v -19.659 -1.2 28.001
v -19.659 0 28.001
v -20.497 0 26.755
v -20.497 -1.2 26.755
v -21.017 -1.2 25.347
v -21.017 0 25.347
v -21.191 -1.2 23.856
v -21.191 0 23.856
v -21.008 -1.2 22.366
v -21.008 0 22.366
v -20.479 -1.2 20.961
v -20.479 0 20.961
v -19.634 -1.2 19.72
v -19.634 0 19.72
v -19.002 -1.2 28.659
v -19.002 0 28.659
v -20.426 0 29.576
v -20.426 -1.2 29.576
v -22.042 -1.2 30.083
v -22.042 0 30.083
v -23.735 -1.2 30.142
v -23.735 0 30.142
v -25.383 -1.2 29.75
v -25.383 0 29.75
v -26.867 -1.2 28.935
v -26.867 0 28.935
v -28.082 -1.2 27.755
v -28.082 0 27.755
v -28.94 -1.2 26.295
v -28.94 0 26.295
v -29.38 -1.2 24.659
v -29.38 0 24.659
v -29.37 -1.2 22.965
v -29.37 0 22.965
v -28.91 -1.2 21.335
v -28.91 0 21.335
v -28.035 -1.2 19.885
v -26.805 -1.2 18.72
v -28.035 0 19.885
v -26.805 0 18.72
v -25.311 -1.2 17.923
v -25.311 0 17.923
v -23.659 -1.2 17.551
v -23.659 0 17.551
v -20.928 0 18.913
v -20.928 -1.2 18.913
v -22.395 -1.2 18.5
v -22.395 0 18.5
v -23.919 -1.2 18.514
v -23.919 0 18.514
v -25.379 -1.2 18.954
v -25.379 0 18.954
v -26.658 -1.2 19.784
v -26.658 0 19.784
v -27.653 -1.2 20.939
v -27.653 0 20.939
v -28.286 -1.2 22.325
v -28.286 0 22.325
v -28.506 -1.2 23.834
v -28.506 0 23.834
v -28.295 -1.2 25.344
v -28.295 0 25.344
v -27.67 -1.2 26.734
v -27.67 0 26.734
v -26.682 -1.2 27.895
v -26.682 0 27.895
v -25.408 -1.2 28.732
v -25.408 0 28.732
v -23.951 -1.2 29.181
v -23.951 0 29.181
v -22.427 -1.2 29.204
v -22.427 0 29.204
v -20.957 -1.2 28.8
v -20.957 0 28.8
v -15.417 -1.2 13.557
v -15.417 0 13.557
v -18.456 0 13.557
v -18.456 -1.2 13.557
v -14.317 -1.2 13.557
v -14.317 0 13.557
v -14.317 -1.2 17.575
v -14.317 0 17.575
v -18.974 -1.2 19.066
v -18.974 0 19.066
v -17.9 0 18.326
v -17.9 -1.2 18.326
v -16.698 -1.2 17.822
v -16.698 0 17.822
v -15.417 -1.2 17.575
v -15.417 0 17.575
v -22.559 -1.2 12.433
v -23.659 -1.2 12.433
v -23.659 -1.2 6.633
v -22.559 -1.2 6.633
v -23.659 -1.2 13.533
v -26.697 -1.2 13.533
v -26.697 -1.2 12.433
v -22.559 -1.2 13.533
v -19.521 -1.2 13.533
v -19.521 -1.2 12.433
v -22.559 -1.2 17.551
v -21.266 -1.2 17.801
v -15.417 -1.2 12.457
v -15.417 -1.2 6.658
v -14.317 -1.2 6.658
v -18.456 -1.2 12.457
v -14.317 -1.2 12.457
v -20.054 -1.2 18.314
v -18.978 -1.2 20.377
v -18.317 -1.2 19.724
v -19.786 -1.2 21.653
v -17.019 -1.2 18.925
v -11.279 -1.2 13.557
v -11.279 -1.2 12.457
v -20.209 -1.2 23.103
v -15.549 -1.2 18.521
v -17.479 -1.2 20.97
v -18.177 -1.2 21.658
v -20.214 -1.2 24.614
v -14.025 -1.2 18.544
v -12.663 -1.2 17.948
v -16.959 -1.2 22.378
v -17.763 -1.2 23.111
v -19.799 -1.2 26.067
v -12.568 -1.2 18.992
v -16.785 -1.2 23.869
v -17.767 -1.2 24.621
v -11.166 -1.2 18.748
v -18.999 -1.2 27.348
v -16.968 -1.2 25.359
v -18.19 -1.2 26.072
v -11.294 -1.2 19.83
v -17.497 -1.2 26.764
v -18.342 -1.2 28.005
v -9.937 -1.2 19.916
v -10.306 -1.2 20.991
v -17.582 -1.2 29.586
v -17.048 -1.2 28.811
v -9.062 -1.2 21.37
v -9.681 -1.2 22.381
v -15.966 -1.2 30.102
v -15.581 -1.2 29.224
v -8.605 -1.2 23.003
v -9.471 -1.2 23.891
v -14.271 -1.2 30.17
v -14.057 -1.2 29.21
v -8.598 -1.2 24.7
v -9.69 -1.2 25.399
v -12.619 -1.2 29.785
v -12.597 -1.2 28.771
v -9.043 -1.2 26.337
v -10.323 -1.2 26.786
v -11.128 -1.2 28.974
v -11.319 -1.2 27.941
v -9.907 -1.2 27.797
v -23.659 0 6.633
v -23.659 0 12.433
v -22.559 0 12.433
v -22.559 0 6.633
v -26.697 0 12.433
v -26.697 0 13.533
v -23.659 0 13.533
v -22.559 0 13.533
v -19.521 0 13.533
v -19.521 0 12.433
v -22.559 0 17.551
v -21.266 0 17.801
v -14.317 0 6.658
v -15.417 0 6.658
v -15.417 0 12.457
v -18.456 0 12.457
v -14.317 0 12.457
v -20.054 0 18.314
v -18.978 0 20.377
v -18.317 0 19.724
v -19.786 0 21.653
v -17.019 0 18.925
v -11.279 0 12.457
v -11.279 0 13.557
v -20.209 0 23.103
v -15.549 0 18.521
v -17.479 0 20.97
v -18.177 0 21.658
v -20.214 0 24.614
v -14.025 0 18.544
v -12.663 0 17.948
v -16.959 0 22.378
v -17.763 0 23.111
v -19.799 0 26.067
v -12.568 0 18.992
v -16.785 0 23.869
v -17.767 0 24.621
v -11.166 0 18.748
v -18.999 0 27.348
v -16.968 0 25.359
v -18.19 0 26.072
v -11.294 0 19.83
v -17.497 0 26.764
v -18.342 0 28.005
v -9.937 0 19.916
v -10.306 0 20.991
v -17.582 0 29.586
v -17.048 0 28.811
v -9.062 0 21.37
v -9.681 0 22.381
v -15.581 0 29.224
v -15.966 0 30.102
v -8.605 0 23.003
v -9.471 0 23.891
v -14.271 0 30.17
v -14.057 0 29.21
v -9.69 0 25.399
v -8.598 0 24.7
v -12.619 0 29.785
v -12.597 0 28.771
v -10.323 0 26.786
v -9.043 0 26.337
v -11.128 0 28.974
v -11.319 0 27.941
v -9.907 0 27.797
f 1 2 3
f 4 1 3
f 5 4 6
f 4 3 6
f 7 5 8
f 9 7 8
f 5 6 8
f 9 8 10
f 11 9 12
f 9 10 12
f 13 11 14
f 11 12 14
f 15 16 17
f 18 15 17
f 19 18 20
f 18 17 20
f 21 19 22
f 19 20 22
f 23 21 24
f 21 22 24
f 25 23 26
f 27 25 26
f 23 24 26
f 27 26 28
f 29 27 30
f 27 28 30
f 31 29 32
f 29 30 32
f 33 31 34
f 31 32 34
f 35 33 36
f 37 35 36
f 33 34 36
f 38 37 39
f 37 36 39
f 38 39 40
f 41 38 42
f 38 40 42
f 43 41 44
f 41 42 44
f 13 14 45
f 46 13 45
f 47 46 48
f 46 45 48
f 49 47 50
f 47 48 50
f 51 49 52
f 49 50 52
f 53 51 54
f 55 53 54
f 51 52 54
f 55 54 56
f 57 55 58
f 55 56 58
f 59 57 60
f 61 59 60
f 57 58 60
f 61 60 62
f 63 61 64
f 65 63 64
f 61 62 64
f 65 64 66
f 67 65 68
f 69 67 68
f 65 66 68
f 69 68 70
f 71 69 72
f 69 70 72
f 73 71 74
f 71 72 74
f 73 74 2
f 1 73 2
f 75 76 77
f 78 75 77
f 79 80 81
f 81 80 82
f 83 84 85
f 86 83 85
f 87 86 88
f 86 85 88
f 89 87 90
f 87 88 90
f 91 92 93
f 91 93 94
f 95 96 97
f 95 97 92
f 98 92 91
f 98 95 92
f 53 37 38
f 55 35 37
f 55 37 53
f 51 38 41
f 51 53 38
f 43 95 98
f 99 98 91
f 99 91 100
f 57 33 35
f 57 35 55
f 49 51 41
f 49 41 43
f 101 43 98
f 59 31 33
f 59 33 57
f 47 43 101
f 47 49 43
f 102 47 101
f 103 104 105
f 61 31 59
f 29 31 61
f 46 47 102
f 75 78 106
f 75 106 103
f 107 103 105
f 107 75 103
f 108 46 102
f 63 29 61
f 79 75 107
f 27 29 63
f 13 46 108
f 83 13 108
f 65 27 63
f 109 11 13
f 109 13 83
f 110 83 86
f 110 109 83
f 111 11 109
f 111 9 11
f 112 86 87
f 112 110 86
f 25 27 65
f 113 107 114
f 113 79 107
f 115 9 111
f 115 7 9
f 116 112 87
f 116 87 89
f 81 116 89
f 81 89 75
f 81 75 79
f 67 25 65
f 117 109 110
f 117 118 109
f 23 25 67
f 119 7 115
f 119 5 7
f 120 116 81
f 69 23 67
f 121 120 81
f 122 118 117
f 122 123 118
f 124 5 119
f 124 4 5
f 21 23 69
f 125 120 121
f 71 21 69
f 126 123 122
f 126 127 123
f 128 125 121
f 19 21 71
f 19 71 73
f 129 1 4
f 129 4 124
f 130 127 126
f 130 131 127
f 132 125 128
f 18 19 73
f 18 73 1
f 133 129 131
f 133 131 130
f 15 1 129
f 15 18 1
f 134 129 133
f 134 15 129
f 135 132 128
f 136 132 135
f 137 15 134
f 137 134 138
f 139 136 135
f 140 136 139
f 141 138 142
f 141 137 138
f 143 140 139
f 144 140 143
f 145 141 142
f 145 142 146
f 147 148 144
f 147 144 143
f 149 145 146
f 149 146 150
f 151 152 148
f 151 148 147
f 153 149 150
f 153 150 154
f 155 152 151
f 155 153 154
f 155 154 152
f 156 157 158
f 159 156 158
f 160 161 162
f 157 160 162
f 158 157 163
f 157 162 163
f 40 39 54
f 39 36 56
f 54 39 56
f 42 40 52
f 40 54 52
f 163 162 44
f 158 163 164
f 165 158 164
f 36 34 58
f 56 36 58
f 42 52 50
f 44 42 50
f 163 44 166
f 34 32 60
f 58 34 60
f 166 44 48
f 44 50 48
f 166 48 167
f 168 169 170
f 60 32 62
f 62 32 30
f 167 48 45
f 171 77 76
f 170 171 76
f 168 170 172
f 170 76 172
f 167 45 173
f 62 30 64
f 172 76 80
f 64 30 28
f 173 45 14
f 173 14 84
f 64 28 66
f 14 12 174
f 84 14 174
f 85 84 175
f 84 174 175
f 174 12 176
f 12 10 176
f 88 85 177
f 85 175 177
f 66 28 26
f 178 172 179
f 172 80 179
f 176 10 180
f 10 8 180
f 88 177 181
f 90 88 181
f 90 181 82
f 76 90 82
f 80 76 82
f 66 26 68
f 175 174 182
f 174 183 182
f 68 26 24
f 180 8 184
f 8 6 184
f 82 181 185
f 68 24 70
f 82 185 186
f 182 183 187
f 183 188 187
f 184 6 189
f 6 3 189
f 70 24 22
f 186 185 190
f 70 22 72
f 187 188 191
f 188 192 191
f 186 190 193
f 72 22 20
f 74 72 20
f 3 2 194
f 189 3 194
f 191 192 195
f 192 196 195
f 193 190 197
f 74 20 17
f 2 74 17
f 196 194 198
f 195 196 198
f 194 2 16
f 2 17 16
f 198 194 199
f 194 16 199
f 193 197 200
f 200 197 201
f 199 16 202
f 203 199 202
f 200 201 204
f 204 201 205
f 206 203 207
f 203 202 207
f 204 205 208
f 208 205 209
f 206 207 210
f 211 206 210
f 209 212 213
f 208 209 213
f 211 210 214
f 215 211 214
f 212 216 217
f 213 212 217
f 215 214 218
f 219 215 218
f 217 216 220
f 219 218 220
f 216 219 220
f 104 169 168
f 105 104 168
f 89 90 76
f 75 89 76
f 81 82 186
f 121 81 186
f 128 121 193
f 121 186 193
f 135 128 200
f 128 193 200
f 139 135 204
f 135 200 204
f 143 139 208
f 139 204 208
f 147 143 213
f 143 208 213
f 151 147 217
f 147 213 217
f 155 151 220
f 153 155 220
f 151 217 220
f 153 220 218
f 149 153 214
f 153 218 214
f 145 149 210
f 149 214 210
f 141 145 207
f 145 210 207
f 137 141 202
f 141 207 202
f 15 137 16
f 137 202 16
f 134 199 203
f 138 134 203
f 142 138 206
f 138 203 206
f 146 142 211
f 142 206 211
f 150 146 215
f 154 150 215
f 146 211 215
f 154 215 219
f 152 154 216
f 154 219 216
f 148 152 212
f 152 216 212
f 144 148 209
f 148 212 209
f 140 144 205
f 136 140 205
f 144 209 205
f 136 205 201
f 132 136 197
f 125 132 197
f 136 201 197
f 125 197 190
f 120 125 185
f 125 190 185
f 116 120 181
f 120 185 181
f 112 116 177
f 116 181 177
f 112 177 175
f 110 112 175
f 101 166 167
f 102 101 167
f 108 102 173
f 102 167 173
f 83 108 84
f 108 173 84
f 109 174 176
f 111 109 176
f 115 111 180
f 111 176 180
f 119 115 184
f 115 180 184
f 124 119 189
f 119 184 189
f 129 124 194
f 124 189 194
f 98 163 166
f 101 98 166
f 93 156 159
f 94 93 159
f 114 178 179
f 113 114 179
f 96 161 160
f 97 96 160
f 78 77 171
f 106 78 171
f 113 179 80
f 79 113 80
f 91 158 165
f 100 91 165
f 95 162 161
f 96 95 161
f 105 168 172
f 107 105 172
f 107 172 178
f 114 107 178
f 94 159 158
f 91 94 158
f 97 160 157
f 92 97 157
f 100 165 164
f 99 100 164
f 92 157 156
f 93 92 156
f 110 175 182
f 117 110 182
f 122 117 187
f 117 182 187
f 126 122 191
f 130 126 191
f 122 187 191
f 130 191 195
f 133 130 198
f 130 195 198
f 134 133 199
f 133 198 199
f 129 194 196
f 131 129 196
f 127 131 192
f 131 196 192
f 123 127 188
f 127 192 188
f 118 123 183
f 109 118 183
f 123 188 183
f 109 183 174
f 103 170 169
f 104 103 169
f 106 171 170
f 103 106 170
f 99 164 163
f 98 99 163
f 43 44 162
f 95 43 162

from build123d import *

# Parameters (mm, degrees)
F1_DEPTH = 1.2


with BuildPart() as f1:
    # F0 (on Front) → F1 (new body)
    with BuildSketch(Plane.XZ):
        with BuildLine():
            Line((-22.558661, 13.532754), (-22.558661, 17.550706))
            ThreePointArc((-22.558661, 17.550706), (-20.646676, 18.025718), (-18.973681, 19.066109))
            ThreePointArc((-18.973681, 19.066109), (-17.31198, 18.043084), (-15.41748, 17.575431))
            Line((-15.41748, 17.575431), (-15.41748, 13.55748))
            Line((-15.41748, 13.55748), (-18.455535, 13.55748))
            Line((-18.455535, 13.55748), (-18.455535, 12.45748))
            Line((-18.455535, 12.45748), (-15.41748, 12.45748))
            Line((-15.41748, 12.45748), (-15.41748, 6.657985))
            Line((-15.41748, 6.657985), (-14.31748, 6.657985))
            Line((-14.31748, 6.657985), (-14.31748, 12.45748))
            Line((-14.31748, 12.45748), (-11.279425, 12.45748))
            Line((-11.279425, 12.45748), (-11.279425, 13.55748))
            Line((-11.279425, 13.55748), (-14.31748, 13.55748))
            Line((-14.31748, 13.55748), (-14.31748, 17.575431))
            ThreePointArc((-14.31748, 17.575431), (-9.043176, 26.336733), (-19.002461, 28.658661))
            ThreePointArc((-19.002461, 28.658661), (-28.940326, 26.294523), (-23.658661, 17.550706))
            Line((-23.658661, 17.550706), (-23.658661, 13.532754))
            Line((-23.658661, 13.532754), (-26.696716, 13.532754))
            Line((-26.696716, 13.532754), (-26.696716, 12.432754))
            Line((-26.696716, 12.432754), (-23.658661, 12.432754))
            Line((-23.658661, 12.432754), (-23.658661, 6.63326))
            Line((-23.658661, 6.63326), (-22.558661, 6.63326))
            Line((-22.558661, 6.63326), (-22.558661, 12.432754))
            Line((-22.558661, 12.432754), (-19.520607, 12.432754))
            Line((-19.520607, 12.432754), (-19.520607, 13.532754))
            Line((-19.520607, 13.532754), (-22.558661, 13.532754))
        make_face()
        with BuildLine():
            ThreePointArc((-19.634369, 19.720153), (-28.505536, 23.833831), (-19.659213, 28.000664))
            ThreePointArc((-19.659213, 28.000664), (-21.190733, 23.855777), (-19.634369, 19.720153))
        make_face(mode=Mode.SUBTRACT)
        with BuildLine():
            ThreePointArc((-18.977614, 20.377132), (-20.264355, 23.858556), (-18.998527, 27.347639))
            ThreePointArc((-18.998527, 27.347639), (-17.711786, 23.866214), (-18.977614, 20.377132))
        make_face(mode=Mode.SUBTRACT)
        with BuildLine():
            ThreePointArc((-18.341772, 28.004617), (-9.470605, 23.89094), (-18.316929, 19.724106))
            ThreePointArc((-18.316929, 19.724106), (-16.785408, 23.868994), (-18.341772, 28.004617))
        make_face(mode=Mode.SUBTRACT)
    extrude(amount=F1_DEPTH)


solid = f1.part
